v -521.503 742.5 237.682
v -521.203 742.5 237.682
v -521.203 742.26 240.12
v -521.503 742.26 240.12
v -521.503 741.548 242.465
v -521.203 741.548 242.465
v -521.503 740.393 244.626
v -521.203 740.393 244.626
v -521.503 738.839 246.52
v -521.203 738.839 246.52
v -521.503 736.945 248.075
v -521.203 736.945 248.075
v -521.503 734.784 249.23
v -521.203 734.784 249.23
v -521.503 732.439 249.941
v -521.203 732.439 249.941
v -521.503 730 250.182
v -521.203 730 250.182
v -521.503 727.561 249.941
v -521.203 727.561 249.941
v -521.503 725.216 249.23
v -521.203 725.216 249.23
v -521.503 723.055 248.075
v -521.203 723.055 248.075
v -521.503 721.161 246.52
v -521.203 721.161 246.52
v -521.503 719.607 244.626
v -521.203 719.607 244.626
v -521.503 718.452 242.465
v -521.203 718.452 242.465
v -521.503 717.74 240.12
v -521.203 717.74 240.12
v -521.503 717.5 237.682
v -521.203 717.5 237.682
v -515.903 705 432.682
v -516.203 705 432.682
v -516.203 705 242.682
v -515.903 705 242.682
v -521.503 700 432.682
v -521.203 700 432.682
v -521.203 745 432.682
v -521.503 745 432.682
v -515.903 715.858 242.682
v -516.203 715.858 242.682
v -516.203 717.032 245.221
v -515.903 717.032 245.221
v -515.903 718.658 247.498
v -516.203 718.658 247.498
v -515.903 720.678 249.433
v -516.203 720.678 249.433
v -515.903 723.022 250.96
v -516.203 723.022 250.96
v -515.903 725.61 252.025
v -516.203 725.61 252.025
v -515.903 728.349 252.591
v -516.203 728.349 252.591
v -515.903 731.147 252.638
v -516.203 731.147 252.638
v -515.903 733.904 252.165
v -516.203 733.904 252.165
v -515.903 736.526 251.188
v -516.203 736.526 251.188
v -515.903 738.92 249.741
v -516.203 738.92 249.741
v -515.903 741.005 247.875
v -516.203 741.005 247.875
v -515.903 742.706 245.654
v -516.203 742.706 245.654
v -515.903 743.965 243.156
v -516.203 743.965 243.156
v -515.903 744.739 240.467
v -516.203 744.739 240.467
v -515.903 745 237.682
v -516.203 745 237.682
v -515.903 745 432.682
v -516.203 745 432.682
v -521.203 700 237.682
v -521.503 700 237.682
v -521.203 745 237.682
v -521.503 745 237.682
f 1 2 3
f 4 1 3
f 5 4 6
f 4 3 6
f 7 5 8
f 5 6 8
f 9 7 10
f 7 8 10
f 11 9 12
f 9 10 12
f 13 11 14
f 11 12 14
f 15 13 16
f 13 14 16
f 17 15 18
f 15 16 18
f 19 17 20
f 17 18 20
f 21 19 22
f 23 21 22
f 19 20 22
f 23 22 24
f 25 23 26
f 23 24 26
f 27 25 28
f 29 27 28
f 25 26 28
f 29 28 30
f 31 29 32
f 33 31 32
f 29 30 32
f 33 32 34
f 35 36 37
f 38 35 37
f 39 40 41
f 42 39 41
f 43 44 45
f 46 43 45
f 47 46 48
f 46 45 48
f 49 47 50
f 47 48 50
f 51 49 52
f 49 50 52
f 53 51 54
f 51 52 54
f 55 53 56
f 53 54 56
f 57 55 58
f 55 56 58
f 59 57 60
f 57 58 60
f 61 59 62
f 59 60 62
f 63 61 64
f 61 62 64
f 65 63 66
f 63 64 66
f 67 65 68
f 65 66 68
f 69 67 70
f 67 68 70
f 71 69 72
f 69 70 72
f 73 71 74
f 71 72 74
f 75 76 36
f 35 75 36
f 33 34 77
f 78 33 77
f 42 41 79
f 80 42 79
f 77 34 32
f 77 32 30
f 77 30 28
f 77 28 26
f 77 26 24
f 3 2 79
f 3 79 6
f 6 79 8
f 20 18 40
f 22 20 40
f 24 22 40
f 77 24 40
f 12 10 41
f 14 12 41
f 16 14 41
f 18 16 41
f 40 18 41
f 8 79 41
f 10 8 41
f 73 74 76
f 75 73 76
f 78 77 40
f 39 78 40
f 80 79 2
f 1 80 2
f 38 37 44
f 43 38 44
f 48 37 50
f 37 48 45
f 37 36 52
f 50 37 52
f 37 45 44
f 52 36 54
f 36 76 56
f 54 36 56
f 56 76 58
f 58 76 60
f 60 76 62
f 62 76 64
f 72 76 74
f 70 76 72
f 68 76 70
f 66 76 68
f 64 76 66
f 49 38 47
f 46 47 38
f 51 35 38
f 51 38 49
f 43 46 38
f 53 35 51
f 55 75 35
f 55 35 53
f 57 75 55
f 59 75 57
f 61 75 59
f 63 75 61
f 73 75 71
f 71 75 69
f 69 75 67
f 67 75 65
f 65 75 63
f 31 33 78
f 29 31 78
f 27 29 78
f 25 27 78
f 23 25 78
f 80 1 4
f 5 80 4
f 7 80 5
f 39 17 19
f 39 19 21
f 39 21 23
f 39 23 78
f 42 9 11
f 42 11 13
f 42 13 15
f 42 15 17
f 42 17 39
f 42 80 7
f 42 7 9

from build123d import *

# Parameters (mm, degrees)
DODANIE_WYCI_GNI_CIE1_DEPTH = 0.3
DODANIE_WYCI_GNI_CIE2_DEPTH = 0.3


with BuildPart() as part:
    # Szkic1 → Dodanie-wyciągnięcie1 (new body)
    with BuildSketch(Plane(origin=(-516.202987023, 0, 0), x_dir=(0, 0, -1), z_dir=(1, 0, 0))):
        with BuildLine():
            Line((-432.681641948, 705), (-242.681641948, 705))
            Line((-242.681641948, 705), (-242.681641948, 715.857864376))
            ThreePointArc((-242.681641948, 715.857864376), (-252.465620342, 732.536529681), (-237.681641948, 745))
            Line((-237.681641948, 745), (-432.681641948, 745))
            Line((-432.681641948, 745), (-432.681641948, 705))
        make_face()
    extrude(amount=DODANIE_WYCI_GNI_CIE1_DEPTH)


with BuildPart() as body_2:
    # Szkic2 → Dodanie-wyciągnięcie2 (new body)
    with BuildSketch(Plane.ZY.offset(521.202987023)):
        with BuildLine():
            Line((432.681641948, 700), (432.681641948, 745))
            Line((432.681641948, 745), (237.681641948, 745))
            Line((237.681641948, 745), (237.681641948, 742.5))
            ThreePointArc((237.681641948, 742.5), (250.181641948, 730), (237.681641948, 717.5))
            Line((237.681641948, 717.5), (237.681641948, 700))
            Line((237.681641948, 700), (432.681641948, 700))
        make_face()
    extrude(amount=DODANIE_WYCI_GNI_CIE2_DEPTH)


solid = Compound([part.part, body_2.part])
